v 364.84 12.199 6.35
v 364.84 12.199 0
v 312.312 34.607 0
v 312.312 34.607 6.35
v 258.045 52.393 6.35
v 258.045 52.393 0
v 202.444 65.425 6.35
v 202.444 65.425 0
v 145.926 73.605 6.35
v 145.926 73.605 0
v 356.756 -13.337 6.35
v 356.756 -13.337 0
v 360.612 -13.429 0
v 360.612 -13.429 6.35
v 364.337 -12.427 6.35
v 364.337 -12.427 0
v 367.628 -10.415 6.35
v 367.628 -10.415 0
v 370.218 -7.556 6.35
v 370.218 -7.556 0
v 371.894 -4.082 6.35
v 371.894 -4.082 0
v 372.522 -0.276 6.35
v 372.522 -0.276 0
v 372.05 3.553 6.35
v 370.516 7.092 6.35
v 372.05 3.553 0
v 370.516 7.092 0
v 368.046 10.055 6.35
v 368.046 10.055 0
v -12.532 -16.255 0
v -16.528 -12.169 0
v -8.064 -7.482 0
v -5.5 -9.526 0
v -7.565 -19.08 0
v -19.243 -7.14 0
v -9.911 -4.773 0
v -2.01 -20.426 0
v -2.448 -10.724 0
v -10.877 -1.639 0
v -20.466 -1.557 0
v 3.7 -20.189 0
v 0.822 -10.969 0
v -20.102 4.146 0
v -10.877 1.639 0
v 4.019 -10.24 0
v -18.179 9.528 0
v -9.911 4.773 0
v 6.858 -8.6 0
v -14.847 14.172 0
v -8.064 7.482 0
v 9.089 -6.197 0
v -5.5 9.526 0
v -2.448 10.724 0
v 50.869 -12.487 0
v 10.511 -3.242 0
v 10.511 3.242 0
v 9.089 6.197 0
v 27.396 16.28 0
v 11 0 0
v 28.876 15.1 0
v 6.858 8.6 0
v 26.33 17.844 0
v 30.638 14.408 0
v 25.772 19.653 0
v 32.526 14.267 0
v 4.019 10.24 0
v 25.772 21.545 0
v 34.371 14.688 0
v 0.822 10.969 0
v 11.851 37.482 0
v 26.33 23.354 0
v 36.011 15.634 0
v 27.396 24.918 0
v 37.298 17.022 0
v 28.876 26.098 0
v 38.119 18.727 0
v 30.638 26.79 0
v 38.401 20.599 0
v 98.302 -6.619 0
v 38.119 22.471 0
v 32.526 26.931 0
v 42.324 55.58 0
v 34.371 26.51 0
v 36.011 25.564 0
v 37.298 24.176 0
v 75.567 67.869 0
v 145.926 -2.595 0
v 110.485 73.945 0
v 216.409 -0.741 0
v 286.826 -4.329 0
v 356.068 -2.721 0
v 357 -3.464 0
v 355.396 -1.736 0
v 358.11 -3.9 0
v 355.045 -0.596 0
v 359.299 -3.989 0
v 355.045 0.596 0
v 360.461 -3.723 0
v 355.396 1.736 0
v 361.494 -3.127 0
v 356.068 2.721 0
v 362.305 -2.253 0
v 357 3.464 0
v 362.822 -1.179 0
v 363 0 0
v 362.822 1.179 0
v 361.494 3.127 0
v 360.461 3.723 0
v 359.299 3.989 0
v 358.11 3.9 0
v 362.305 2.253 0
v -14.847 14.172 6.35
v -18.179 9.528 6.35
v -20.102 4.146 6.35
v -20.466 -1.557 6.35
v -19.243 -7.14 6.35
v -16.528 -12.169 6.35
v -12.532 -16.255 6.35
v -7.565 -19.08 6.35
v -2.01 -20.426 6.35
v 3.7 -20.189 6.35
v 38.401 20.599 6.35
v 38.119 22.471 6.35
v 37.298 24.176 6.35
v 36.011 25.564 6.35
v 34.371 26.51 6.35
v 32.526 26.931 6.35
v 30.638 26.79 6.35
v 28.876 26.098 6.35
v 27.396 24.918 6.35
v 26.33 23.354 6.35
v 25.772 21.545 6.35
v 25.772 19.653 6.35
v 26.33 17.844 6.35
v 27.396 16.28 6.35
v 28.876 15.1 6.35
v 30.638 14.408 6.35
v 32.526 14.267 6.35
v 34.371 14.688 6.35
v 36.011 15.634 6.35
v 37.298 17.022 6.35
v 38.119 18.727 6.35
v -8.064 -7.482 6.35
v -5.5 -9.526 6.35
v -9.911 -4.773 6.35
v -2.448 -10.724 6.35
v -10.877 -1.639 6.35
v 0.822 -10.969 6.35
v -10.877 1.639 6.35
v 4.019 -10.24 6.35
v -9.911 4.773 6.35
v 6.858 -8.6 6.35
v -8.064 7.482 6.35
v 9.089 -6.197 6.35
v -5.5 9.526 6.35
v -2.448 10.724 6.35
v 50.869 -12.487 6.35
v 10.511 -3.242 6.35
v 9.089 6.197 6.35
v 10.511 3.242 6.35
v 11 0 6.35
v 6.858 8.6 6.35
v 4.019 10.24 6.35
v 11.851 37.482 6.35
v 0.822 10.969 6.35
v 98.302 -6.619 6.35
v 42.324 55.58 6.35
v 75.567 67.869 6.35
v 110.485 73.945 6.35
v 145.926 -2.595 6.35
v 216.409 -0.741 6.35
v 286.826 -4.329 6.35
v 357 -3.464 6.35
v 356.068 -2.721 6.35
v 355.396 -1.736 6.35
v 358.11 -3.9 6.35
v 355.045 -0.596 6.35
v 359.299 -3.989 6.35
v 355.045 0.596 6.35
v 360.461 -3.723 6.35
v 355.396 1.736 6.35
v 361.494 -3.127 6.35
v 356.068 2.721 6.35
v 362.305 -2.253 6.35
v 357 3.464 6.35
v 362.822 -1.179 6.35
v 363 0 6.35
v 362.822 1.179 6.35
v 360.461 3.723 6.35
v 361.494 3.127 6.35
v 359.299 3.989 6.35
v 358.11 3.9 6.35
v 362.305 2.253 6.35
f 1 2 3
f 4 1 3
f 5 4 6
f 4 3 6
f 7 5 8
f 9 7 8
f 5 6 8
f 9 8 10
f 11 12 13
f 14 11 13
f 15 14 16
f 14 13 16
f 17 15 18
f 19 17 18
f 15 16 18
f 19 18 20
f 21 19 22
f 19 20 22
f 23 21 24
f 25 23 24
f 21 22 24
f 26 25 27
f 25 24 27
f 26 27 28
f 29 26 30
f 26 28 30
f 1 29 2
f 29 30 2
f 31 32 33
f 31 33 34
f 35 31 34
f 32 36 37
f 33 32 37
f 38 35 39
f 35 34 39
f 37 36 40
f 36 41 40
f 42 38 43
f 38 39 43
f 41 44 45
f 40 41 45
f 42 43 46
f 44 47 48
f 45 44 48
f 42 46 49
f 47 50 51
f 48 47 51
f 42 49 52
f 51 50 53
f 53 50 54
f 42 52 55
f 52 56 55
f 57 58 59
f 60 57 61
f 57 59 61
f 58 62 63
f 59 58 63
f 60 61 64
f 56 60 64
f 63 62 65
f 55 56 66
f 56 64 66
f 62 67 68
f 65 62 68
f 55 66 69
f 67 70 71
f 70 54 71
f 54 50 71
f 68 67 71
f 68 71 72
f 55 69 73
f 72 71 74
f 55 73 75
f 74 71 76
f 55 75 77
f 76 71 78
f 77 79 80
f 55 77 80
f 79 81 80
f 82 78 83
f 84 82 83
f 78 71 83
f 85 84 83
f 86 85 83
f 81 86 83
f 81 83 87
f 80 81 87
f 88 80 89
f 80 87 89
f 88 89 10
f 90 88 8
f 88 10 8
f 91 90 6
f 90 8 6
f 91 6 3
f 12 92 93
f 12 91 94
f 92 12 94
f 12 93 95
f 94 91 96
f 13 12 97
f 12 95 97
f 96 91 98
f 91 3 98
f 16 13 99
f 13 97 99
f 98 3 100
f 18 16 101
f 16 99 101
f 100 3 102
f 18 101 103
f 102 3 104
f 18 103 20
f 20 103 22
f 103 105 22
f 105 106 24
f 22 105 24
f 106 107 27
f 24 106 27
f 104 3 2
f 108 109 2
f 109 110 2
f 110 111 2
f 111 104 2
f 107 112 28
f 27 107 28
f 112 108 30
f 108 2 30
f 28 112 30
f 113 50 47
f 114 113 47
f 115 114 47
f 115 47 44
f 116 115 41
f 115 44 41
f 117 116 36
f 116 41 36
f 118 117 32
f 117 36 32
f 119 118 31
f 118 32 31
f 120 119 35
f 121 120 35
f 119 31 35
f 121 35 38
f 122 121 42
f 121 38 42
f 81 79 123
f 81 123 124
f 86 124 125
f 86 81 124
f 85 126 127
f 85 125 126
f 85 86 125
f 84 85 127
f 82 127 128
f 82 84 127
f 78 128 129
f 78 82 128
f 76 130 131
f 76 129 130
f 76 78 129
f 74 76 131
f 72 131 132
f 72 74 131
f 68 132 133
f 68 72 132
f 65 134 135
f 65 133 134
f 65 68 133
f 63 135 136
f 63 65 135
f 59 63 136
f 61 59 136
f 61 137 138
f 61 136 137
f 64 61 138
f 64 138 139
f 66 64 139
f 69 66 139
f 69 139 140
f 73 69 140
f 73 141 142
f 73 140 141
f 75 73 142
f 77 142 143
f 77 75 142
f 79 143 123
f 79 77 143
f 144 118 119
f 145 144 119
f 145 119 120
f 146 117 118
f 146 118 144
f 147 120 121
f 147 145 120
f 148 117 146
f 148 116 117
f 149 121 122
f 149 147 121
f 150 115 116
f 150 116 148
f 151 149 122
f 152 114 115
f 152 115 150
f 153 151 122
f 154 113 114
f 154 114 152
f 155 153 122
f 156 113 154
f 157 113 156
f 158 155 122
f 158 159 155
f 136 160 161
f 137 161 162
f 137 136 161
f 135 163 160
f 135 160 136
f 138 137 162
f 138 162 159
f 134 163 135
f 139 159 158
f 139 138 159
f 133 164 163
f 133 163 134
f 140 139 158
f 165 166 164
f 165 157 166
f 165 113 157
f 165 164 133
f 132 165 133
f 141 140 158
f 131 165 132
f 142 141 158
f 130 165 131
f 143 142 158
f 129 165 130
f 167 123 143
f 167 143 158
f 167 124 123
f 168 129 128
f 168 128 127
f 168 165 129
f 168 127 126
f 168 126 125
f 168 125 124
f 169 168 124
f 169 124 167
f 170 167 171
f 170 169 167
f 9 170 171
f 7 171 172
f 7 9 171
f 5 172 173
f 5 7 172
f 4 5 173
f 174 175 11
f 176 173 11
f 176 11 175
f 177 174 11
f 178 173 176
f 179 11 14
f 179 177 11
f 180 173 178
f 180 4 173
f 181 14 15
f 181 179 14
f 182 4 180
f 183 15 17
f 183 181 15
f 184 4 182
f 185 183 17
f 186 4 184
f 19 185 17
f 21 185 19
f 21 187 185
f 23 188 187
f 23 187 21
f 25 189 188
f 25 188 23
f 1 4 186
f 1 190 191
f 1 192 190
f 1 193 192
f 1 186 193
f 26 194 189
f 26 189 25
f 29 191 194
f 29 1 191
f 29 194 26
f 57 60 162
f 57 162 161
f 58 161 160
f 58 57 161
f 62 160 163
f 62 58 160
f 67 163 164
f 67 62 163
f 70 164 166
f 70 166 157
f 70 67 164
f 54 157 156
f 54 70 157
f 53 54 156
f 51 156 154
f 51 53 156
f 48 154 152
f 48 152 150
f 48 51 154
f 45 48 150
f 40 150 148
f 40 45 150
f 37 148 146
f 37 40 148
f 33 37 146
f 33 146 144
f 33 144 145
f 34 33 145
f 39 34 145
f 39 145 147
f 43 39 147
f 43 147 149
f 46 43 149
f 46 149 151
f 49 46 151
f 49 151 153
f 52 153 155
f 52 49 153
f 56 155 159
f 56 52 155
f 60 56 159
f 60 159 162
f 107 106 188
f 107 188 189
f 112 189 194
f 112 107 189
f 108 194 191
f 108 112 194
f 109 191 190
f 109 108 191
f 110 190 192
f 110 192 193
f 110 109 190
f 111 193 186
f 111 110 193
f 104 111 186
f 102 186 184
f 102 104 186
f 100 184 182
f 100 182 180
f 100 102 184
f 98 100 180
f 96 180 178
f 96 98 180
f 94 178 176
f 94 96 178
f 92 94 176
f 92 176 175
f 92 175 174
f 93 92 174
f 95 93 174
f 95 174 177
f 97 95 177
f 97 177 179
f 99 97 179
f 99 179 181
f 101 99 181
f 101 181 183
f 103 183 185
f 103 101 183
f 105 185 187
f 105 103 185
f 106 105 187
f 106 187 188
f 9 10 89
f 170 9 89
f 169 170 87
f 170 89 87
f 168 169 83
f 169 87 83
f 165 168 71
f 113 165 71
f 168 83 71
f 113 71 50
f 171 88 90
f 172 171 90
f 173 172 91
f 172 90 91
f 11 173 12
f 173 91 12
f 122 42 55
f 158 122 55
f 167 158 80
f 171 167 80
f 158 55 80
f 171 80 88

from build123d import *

# Parameters (mm, degrees)
SKETCH1_R               = 11
SKETCH1_R_2             = 4
BOSS_EXTRUDE1_DEPTH     = 6.35
CUT_EXTRUDE1_DEPTH      = 380.972155331
CUT_EXTRUDE1_DEPTH_BACK = 380.972155331
SKETCH2_R               = 6.35


with BuildPart() as part:
    # Sketch1 → Boss-Extrude1 (new body)
    with BuildSketch(Plane.XY):
        with BuildLine():
            ThreePointArc((-14.847301451, 14.171565356), (-18.06169524, -9.749399473), (3.699835438, -20.18878012))
            ThreePointArc((3.699835438, -20.18878012), (74.556998508, -9.322867247), (145.926048807, -2.594993863))
            ThreePointArc((145.926048807, -2.594993863), (251.652155026, -1.855156614), (356.755502219, -13.337460579))
            ThreePointArc((356.755502219, -13.337460579), (371.894318042, -4.08193425), (364.839650306, 12.199348725))
            ThreePointArc((364.839650306, 12.199348725), (258.044932978, 52.392610297), (145.926048807, 73.605006137))
            ThreePointArc((145.926048807, 73.605006137), (58.666161858, 62.481005213), (-14.847301451, 14.171565356))
        make_face()
        Circle(SKETCH1_R, mode=Mode.SUBTRACT)
        with Locations((359, 0)):
            Circle(SKETCH1_R_2, mode=Mode.SUBTRACT)
    extrude(amount=BOSS_EXTRUDE1_DEPTH)

    # Sketch2 → Cut-Extrude1 (cut, two sides: drawn at the far end of the back side and taken through both)
    with BuildSketch(Plane.XY.offset(6.35).offset(-CUT_EXTRUDE1_DEPTH_BACK)):
        with Locations((32.051371855, 20.599018477)):
            Circle(SKETCH2_R)
    extrude(amount=CUT_EXTRUDE1_DEPTH + CUT_EXTRUDE1_DEPTH_BACK, mode=Mode.SUBTRACT)


solid = part.part
